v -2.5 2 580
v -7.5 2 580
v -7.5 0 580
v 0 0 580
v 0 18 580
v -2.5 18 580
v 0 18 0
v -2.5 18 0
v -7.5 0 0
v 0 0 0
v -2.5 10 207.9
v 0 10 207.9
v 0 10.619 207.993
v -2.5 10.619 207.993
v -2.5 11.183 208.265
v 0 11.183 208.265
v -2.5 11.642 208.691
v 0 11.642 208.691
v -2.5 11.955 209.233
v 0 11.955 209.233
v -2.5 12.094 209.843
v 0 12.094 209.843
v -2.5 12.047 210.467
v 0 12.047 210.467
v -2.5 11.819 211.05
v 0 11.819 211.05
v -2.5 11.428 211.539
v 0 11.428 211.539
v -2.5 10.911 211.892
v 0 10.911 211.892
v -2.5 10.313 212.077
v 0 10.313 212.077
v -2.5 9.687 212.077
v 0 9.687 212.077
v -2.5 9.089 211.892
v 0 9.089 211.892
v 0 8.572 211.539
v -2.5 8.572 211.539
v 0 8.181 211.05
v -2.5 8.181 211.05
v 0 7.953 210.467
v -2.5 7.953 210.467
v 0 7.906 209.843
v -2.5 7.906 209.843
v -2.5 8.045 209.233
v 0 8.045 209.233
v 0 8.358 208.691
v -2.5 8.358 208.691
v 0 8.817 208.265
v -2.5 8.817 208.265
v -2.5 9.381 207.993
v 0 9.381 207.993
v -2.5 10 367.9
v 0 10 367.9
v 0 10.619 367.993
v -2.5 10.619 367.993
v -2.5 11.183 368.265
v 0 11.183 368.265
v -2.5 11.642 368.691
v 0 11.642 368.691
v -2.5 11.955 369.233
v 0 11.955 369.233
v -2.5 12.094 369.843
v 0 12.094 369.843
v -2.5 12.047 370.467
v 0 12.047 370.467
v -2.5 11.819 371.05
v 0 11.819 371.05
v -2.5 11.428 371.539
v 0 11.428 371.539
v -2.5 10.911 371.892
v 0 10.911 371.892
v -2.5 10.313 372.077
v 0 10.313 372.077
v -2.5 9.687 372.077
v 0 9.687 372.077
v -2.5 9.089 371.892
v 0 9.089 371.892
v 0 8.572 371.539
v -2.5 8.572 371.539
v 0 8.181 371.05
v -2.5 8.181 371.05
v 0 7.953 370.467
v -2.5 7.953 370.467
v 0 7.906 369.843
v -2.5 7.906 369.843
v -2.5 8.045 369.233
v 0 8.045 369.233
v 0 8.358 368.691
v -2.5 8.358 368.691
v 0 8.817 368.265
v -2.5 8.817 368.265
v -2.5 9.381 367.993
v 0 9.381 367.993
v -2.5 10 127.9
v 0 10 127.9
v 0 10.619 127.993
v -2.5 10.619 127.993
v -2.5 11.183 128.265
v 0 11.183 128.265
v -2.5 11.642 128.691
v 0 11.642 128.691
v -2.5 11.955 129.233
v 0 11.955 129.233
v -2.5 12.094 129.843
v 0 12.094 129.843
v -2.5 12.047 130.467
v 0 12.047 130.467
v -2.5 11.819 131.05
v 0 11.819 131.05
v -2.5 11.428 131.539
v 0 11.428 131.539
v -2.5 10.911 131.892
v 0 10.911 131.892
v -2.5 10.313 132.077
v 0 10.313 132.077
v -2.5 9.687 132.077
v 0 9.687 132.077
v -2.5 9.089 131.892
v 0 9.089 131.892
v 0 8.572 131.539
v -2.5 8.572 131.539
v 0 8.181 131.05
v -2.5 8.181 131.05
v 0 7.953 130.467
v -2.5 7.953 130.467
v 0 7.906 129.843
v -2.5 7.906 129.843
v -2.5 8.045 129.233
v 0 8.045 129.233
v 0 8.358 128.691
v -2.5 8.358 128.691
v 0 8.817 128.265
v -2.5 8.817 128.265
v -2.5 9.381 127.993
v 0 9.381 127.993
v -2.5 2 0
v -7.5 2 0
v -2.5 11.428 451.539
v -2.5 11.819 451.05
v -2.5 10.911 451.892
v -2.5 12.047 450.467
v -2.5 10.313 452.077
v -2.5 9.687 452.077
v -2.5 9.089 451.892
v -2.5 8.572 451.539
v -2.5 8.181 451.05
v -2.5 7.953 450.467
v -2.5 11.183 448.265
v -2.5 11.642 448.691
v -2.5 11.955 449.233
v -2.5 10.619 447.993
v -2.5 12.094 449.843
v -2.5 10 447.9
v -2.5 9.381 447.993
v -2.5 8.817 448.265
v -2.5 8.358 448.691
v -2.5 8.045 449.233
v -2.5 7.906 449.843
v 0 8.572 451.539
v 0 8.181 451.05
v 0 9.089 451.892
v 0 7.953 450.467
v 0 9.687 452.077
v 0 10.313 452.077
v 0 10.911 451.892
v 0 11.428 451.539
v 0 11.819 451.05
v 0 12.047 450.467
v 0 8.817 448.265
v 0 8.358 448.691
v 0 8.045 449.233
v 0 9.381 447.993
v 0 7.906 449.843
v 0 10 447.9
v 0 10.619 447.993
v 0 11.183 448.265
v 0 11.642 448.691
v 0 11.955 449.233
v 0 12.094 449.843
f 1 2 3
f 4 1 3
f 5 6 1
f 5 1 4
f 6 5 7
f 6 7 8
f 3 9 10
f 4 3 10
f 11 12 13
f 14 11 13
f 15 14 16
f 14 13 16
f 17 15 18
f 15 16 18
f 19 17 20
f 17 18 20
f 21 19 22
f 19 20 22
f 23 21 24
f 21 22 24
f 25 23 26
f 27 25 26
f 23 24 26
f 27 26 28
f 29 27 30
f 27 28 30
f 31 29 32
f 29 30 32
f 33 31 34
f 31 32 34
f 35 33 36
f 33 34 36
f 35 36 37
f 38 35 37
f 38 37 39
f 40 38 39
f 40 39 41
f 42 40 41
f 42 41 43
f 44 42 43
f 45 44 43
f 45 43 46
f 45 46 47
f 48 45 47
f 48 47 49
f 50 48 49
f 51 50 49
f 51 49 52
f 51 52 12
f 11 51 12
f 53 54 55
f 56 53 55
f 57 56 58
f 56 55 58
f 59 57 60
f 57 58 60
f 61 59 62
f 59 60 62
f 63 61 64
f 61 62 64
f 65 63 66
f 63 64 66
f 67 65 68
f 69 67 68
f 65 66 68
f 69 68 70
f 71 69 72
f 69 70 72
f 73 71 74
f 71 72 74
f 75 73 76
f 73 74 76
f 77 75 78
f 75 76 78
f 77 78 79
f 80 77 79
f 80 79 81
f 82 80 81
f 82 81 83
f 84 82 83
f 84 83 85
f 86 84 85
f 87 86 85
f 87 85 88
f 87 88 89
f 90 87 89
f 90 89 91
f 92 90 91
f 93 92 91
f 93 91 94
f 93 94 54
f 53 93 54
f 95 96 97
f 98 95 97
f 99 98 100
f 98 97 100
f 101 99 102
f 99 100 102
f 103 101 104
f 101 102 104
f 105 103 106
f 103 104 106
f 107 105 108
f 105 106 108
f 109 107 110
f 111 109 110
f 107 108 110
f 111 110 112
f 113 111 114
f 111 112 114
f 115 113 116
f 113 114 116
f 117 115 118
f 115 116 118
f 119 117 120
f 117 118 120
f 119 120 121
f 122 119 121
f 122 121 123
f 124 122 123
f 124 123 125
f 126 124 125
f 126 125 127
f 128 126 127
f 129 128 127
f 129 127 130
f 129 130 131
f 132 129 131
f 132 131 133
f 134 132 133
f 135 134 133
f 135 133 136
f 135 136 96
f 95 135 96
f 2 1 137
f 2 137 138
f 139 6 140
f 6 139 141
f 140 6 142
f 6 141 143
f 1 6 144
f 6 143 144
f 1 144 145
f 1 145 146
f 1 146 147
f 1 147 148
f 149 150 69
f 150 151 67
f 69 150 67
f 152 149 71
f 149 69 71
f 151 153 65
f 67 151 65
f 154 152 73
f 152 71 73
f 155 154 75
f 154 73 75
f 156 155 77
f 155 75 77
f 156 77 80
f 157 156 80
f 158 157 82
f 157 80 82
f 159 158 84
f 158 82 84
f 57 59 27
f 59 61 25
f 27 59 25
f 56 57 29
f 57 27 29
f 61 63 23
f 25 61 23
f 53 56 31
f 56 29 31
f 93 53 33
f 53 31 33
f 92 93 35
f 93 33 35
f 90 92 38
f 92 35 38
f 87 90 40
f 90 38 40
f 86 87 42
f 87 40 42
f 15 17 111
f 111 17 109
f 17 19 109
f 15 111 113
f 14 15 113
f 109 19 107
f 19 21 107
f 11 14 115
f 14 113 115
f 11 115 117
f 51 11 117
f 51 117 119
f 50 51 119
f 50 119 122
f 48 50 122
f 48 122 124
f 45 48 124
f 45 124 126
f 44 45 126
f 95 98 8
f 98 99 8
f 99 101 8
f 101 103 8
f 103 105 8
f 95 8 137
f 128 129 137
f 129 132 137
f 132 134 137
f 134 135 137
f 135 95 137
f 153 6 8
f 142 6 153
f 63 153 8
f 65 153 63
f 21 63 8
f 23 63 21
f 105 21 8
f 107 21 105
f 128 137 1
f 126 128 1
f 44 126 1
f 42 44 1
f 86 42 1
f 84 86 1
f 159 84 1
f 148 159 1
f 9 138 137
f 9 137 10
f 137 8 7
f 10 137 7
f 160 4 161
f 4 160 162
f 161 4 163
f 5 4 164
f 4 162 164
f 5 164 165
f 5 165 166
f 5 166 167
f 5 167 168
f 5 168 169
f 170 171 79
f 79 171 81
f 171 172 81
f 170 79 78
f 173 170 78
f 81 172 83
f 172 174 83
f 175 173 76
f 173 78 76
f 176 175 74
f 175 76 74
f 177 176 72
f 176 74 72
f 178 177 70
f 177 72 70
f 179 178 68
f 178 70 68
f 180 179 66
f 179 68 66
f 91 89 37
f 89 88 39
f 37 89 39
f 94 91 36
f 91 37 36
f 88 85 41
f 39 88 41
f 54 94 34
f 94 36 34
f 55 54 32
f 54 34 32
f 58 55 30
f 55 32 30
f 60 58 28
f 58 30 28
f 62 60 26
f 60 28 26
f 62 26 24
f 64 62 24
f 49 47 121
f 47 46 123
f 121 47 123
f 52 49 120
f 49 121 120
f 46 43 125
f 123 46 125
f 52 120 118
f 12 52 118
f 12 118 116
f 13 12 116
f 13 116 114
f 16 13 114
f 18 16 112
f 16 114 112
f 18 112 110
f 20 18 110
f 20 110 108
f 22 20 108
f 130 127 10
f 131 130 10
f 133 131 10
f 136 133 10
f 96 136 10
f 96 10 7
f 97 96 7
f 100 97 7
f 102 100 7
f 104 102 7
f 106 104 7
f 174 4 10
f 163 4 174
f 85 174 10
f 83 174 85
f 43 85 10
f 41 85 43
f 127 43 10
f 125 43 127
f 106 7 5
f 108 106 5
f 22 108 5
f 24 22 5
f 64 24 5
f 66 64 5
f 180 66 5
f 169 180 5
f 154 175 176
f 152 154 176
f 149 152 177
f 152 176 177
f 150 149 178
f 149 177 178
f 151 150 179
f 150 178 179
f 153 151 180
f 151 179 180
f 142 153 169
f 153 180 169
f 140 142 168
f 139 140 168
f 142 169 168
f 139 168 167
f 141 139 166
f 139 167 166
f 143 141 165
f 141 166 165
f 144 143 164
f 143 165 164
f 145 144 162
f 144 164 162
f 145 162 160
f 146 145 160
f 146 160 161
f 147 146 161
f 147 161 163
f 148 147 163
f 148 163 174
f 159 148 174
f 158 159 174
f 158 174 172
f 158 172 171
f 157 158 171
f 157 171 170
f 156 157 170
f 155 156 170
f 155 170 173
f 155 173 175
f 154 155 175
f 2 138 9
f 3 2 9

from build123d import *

# Parameters (mm, degrees)
EXTRUDE_1_DEPTH    = 580
HOLE_WIZARD_M5_1_D = 4.2


with BuildPart() as part:
    # 草图1 → 凸台-拉伸1 (new body)
    with BuildSketch(Plane.XY):
        Polygon((0, 0), (0, 18), (-2.5, 18), (-2.5, 2), (-7.5, 2), (-7.5, 0), align=None)
    extrude(amount=EXTRUDE_1_DEPTH)

    # M5 螺纹孔1 (through all)
    with Locations(Plane.ZY.offset(2.5)):
        with Locations((130, 10), (210, 10), (370, 10), (450, 10)):
            Hole(HOLE_WIZARD_M5_1_D / 2)


solid = part.part
